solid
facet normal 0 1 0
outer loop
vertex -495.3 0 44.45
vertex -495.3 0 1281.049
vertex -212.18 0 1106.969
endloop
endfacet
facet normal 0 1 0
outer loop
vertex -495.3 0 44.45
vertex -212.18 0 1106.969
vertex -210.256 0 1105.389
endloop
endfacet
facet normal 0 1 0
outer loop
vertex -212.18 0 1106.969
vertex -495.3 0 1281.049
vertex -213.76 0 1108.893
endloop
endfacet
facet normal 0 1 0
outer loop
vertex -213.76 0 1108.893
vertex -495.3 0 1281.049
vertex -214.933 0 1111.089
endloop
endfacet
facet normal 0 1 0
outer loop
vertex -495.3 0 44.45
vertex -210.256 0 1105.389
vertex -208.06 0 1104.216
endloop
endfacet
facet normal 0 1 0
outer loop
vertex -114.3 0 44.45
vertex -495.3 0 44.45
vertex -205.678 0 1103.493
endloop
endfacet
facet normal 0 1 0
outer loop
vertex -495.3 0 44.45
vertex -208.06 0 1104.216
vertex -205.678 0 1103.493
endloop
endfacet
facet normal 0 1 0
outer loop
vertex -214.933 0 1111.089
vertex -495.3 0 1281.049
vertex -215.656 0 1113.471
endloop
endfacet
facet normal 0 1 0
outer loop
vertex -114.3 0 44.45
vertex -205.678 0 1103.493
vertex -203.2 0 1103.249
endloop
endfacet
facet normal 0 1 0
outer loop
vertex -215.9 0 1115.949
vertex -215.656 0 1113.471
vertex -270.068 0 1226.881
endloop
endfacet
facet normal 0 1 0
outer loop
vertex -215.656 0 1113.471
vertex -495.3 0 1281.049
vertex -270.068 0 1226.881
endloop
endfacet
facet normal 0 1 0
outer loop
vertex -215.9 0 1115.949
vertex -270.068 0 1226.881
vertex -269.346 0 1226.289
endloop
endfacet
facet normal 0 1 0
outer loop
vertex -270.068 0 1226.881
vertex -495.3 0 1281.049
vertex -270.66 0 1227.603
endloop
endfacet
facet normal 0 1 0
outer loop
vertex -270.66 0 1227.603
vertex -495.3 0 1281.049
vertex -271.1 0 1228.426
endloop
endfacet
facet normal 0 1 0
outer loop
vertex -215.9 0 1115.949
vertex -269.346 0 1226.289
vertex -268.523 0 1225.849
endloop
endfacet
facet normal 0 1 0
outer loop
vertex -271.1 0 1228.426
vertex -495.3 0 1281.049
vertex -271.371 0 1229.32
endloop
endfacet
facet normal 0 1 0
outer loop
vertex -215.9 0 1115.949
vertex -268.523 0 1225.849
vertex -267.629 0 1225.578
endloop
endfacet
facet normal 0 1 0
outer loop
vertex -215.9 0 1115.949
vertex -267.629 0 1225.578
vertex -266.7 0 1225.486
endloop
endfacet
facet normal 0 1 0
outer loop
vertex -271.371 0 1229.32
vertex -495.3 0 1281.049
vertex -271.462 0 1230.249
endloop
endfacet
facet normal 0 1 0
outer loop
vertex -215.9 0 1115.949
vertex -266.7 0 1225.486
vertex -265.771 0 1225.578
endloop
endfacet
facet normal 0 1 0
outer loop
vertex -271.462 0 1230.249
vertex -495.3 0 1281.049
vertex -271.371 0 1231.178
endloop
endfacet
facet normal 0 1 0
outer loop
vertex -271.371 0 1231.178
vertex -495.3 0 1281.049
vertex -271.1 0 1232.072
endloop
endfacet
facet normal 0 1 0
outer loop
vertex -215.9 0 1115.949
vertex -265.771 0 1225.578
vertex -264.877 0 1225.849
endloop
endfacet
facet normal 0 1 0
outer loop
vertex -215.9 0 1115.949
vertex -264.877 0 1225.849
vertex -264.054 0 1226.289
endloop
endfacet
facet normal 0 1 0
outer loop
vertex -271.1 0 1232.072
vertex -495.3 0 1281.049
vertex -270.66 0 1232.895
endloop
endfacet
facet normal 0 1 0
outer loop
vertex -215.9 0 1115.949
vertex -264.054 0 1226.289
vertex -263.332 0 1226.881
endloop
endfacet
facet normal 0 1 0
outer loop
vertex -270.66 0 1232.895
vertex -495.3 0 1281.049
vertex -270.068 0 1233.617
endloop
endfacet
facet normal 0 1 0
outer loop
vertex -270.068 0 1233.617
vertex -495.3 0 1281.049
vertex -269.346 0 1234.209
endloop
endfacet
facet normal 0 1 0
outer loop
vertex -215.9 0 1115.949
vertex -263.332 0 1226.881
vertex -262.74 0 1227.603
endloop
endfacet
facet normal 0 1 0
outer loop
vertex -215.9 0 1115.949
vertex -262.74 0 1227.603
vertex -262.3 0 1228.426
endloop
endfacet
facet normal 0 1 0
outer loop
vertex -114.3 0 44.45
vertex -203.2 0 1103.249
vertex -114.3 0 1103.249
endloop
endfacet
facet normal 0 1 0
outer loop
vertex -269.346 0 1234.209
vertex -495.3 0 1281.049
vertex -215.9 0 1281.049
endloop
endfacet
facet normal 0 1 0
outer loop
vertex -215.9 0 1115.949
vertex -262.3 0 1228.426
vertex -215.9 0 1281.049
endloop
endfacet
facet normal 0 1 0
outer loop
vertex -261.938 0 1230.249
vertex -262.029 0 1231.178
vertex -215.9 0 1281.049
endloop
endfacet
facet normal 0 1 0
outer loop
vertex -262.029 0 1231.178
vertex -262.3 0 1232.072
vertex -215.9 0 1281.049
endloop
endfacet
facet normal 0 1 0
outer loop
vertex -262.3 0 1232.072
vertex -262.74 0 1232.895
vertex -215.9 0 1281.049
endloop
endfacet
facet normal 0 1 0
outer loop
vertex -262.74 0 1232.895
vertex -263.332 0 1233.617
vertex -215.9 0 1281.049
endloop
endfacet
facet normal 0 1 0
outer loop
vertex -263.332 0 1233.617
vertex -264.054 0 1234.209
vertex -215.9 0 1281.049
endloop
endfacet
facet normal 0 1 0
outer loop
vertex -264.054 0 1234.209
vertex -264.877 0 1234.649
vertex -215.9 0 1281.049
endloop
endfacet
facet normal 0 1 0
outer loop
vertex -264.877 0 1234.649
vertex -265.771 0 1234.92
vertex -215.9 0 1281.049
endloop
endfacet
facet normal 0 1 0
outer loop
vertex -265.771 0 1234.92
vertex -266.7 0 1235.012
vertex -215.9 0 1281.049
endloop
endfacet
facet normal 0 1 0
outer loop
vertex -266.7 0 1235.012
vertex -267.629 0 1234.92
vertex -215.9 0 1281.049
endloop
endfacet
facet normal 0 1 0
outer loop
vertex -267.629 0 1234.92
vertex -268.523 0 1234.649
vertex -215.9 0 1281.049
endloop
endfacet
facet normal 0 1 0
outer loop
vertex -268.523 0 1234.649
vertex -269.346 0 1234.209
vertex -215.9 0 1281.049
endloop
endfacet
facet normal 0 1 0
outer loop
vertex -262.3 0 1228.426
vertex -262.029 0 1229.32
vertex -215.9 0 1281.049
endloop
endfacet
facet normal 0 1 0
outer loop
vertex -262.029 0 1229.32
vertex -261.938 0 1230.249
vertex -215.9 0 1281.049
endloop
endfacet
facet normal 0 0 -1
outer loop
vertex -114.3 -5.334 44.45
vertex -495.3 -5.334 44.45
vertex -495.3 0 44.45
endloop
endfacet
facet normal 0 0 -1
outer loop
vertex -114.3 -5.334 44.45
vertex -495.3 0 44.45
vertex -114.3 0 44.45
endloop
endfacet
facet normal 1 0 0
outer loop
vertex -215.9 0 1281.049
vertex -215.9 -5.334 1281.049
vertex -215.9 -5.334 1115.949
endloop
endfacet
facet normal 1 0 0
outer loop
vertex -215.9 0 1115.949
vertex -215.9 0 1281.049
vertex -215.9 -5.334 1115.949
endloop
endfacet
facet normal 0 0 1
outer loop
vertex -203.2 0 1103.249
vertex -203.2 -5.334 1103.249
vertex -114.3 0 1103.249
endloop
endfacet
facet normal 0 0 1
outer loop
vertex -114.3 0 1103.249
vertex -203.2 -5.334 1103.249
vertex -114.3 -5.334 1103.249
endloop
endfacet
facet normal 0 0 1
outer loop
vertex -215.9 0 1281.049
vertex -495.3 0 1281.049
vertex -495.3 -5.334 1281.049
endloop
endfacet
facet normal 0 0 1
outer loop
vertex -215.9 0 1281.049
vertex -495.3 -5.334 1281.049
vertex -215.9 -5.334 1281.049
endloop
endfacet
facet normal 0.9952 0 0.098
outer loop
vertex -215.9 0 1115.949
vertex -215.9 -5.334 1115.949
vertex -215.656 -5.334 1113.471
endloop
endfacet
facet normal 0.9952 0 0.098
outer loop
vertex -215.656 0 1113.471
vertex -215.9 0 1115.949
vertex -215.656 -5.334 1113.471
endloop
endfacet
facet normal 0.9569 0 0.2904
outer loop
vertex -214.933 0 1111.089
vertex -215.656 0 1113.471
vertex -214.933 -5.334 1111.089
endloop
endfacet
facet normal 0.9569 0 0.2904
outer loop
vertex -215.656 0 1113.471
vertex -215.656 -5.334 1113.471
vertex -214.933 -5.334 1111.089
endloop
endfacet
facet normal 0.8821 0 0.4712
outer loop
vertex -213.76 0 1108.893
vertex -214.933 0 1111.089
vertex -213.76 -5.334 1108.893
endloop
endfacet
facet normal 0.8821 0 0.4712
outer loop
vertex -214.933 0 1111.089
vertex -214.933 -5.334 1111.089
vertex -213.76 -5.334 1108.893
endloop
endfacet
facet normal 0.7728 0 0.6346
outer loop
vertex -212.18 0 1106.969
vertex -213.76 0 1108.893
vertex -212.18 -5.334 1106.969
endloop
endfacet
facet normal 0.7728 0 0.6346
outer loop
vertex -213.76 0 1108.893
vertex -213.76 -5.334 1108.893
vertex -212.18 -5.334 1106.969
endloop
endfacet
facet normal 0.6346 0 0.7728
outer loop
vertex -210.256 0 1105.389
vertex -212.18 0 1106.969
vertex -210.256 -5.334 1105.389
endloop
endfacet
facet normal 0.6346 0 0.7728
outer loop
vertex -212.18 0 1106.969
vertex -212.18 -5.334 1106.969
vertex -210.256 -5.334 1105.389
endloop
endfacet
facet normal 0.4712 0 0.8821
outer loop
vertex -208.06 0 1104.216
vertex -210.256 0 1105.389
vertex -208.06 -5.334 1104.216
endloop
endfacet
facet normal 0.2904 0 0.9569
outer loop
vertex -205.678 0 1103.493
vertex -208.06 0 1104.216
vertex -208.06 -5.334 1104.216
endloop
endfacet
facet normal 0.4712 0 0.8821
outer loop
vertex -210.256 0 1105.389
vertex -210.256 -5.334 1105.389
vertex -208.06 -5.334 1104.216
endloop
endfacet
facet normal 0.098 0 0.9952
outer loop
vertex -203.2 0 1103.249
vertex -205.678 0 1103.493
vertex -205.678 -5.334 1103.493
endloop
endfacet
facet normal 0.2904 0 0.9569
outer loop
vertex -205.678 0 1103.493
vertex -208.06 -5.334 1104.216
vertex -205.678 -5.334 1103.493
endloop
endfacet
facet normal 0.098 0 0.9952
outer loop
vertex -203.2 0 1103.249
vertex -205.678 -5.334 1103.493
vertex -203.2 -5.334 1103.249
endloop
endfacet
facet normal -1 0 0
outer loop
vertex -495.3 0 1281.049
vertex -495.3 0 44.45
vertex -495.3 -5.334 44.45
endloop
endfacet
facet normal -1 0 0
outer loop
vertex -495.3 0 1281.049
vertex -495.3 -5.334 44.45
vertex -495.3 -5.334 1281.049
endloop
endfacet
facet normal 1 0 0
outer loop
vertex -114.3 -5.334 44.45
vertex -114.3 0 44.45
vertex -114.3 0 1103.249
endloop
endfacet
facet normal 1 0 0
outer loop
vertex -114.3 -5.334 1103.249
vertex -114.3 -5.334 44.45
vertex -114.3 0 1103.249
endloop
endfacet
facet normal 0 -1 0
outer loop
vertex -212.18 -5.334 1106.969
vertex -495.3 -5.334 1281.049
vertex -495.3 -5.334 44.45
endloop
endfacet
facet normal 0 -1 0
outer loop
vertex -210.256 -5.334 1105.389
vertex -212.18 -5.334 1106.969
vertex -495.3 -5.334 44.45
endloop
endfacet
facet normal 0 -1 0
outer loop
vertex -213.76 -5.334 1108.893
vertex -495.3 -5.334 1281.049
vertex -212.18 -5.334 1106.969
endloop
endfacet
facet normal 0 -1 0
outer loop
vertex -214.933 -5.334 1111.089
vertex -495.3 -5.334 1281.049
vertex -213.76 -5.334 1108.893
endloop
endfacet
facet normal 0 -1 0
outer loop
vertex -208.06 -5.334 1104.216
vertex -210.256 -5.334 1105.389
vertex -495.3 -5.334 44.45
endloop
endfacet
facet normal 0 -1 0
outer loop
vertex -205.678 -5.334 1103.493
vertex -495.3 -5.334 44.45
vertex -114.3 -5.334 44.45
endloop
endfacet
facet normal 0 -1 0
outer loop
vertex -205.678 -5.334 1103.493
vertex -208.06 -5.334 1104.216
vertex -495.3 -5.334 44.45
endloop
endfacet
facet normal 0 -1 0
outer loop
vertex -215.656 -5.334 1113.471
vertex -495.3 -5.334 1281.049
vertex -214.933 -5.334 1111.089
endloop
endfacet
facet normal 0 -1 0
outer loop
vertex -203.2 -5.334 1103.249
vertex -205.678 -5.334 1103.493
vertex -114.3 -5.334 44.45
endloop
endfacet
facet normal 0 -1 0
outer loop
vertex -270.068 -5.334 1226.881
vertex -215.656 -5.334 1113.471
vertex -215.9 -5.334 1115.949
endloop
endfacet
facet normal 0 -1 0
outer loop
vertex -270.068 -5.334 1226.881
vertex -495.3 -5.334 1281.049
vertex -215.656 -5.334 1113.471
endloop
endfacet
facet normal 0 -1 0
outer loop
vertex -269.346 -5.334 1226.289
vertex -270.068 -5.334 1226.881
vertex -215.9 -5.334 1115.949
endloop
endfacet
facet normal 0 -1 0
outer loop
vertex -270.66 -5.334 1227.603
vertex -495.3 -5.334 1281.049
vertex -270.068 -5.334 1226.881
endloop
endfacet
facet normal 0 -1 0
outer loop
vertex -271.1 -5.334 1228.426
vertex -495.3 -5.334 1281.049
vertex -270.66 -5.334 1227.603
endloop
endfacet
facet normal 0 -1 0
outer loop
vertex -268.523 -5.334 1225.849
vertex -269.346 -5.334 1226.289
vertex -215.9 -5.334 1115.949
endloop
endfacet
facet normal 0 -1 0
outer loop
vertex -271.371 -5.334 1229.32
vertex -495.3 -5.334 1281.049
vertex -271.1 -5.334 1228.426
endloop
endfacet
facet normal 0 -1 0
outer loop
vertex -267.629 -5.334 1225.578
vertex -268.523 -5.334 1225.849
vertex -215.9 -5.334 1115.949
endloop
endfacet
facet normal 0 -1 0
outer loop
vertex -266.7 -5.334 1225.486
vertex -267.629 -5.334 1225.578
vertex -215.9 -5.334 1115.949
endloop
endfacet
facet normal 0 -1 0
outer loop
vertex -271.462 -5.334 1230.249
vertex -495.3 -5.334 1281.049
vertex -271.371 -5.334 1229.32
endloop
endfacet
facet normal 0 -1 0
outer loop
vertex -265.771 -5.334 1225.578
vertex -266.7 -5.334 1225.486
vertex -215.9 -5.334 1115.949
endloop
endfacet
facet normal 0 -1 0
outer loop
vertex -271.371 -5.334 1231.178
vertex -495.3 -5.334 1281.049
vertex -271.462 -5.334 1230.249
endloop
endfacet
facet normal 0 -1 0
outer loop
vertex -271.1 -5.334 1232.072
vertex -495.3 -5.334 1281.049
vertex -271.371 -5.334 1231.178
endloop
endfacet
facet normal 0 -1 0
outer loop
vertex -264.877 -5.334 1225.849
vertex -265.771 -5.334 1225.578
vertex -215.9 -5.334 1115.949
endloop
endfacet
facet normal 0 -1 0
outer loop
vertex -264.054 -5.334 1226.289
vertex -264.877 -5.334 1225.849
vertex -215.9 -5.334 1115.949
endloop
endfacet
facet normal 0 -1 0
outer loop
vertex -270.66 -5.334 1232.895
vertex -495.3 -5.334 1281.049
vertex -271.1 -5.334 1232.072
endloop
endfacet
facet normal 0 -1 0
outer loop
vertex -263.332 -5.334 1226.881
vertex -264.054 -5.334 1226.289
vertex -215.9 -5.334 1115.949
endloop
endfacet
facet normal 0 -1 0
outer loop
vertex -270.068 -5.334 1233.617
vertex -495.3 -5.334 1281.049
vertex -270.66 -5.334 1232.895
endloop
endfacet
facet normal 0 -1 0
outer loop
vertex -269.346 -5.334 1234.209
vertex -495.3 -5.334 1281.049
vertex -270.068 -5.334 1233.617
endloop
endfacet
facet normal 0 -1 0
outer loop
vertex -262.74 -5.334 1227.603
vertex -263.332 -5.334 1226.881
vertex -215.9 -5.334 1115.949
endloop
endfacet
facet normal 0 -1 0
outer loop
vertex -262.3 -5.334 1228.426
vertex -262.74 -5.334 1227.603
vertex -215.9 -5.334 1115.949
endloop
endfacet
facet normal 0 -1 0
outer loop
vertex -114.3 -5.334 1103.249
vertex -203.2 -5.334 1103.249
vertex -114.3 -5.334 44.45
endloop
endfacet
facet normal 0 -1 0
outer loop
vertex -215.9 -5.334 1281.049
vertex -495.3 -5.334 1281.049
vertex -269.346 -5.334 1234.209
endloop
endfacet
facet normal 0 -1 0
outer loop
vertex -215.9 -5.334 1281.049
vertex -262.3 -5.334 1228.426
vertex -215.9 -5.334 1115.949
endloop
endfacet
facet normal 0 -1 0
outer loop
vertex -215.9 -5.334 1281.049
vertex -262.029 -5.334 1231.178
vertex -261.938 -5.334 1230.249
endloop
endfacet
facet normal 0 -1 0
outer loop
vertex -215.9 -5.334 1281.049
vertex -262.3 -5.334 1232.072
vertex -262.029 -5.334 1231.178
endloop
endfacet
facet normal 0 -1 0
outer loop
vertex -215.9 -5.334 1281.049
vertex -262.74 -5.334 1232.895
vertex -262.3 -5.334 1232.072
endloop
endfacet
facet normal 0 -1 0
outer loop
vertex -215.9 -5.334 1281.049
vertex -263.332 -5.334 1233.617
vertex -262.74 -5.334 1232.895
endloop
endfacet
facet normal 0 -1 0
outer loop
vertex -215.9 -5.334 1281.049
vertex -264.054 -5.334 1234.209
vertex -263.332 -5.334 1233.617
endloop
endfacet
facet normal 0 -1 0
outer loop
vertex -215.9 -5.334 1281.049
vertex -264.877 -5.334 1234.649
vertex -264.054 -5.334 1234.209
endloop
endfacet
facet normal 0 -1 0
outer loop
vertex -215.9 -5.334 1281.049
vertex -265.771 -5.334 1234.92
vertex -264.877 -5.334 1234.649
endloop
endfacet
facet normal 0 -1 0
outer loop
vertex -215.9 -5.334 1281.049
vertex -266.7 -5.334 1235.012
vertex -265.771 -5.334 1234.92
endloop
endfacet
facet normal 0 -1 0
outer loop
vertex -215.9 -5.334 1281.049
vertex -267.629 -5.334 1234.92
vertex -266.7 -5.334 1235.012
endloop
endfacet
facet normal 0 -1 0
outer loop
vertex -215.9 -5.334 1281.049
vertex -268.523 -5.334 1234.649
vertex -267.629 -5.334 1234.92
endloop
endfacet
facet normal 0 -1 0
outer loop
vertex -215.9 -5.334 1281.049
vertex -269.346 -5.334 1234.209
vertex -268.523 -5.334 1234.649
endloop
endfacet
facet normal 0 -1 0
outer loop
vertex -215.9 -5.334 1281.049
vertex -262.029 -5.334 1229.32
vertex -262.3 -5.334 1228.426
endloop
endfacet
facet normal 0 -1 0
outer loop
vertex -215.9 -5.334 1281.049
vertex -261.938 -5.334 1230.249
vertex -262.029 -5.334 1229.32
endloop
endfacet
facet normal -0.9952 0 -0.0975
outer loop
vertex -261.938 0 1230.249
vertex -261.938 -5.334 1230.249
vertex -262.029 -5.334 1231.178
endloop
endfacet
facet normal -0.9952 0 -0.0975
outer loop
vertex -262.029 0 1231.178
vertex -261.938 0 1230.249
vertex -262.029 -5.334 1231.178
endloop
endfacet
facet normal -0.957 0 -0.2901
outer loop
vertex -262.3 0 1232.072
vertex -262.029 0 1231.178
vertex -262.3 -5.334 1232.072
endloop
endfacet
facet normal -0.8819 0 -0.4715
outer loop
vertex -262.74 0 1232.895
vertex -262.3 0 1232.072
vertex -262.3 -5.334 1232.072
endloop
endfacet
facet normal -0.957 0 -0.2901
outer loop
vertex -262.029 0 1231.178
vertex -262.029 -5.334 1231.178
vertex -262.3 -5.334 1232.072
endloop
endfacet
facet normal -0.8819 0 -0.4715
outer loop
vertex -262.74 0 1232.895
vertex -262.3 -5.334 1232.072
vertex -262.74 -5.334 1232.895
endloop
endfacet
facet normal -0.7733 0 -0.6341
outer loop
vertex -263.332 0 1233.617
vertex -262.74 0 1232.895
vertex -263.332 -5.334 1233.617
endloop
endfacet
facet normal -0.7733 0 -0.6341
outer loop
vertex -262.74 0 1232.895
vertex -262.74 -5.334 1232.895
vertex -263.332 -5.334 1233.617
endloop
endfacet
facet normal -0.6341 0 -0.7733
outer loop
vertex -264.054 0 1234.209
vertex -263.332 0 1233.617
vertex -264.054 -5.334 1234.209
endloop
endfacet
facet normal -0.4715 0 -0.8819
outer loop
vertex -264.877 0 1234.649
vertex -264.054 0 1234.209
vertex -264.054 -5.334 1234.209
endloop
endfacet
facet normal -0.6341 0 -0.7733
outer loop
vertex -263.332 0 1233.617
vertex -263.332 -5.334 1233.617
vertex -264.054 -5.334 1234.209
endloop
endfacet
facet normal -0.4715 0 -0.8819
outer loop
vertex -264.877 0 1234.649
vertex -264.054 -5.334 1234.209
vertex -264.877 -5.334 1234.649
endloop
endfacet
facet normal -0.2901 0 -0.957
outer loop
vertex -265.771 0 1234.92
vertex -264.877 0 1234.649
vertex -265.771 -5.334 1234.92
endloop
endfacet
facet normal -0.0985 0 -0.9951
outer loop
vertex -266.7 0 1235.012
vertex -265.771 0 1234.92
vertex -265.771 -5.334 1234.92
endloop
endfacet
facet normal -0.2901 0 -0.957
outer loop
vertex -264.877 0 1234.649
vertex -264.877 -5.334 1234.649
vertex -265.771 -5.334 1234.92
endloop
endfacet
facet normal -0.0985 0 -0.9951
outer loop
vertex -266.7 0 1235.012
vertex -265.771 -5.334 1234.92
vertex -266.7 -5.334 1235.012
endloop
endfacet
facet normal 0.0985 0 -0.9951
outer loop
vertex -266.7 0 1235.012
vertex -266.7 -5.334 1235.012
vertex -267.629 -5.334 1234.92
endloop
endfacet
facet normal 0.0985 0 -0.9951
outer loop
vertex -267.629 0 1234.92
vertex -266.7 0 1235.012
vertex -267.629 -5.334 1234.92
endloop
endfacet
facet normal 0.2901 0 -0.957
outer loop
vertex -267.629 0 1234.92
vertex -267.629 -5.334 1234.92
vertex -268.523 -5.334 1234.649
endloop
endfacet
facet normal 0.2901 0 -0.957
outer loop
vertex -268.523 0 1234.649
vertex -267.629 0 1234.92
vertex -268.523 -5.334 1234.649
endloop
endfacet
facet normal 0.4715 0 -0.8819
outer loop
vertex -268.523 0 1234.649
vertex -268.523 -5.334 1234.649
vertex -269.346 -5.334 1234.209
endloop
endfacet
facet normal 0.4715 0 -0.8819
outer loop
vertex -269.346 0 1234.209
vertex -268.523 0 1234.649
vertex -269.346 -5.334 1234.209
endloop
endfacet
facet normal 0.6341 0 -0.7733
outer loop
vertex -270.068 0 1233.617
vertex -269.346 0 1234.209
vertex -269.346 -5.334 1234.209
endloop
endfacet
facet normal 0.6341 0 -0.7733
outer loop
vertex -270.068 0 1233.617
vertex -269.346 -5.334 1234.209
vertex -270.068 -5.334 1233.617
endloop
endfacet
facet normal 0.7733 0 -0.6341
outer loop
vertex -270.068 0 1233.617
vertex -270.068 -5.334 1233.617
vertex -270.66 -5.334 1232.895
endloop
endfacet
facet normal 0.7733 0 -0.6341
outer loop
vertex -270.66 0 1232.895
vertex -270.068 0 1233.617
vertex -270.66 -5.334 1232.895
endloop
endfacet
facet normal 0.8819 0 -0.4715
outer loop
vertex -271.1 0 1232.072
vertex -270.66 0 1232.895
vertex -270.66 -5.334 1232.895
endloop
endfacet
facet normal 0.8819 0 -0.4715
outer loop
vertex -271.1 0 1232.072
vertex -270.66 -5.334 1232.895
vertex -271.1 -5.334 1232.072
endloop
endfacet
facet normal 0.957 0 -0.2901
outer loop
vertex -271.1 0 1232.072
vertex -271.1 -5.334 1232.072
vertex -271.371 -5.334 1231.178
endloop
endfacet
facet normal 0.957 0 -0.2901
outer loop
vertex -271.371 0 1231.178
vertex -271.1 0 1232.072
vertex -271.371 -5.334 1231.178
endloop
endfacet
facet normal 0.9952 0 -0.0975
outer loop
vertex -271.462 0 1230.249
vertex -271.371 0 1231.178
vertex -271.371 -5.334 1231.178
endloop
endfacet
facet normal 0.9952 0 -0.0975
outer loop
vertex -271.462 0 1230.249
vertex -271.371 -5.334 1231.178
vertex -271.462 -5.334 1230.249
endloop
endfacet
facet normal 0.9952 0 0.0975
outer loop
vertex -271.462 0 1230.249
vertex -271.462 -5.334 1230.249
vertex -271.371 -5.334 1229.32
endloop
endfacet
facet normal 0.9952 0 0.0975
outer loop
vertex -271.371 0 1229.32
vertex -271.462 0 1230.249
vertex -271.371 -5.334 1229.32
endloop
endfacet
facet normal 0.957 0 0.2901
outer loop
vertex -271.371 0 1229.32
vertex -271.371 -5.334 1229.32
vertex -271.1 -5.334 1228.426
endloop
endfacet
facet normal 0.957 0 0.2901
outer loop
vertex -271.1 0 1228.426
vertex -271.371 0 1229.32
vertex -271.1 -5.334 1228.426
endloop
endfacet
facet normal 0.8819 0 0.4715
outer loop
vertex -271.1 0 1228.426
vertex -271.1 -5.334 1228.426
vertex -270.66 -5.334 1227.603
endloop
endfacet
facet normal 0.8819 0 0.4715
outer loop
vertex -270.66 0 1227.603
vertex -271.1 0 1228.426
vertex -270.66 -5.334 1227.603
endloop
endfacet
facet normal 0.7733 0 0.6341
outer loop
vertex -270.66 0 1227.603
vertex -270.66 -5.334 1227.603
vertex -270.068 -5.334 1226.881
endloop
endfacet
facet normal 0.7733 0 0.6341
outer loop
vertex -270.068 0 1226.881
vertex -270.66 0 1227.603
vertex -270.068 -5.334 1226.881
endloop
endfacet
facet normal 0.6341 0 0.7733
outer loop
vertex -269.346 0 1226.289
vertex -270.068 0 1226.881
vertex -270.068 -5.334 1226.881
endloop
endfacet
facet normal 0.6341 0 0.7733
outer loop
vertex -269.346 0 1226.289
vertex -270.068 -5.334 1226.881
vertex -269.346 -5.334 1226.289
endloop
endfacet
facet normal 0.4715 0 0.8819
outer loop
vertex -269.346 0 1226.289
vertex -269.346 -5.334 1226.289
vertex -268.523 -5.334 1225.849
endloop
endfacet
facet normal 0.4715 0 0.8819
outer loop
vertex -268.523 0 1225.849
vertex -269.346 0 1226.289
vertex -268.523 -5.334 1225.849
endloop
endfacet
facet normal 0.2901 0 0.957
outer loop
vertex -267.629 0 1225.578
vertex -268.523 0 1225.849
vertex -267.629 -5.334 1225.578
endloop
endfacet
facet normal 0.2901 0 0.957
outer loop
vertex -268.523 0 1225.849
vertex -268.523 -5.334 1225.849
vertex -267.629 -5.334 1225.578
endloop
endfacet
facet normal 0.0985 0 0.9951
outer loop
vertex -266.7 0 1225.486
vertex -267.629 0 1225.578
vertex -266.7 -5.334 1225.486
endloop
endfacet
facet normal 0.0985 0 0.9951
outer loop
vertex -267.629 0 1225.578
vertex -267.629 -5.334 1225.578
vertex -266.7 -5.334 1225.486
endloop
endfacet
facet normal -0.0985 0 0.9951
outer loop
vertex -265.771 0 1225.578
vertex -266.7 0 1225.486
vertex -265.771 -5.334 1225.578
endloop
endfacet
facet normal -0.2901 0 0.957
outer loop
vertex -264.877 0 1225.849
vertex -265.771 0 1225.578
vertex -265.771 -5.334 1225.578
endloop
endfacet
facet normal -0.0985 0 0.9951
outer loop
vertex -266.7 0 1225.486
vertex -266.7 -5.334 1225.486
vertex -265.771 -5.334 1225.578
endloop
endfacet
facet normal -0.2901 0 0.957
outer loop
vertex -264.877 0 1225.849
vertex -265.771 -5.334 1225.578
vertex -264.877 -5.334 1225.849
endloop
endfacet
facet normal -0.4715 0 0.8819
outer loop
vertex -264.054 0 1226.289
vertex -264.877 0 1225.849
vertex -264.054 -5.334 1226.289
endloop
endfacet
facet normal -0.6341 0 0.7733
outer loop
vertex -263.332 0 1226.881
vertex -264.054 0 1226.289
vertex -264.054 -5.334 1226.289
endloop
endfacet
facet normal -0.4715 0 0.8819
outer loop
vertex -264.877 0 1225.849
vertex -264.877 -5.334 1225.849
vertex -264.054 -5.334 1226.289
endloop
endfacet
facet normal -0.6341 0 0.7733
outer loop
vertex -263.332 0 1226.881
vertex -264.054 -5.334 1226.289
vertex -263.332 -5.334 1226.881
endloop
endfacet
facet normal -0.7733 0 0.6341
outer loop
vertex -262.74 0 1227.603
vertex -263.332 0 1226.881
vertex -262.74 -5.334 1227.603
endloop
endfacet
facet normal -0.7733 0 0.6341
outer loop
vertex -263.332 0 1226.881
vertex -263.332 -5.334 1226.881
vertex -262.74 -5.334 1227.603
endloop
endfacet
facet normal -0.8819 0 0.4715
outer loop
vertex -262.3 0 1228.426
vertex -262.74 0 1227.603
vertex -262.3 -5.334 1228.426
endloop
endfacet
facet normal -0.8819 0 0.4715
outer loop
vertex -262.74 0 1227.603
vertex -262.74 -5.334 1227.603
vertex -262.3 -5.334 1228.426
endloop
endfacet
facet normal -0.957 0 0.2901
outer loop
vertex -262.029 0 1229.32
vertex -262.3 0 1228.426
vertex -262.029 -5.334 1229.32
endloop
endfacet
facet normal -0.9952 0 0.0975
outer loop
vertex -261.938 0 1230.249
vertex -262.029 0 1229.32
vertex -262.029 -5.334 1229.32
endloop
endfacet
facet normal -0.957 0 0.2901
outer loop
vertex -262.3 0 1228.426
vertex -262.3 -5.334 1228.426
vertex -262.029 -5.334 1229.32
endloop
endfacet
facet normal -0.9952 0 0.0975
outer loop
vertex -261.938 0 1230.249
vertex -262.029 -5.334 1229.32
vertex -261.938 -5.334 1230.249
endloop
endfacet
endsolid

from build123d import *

# Parameters (mm, degrees)
F0_W     = 381
F0_H     = 1281.049
F1_DEPTH = 5.334
F3_DEPTH = 25.4
F4_W     = 381
F4_H     = 44.45
F5_DEPTH = 25.4
F6_R     = 4.7625
F7_DEPTH = 25.4


with BuildPart() as f1:
    # F0 (on Front) → F1 (new body)
    with BuildSketch(Plane.XZ):
        with Locations((-304.8, 640.5245)):
            Rectangle(F0_W, F0_H)
    extrude(amount=F1_DEPTH)

    # F2 (on face) → F3 (cut)
    with BuildSketch(Plane.XZ.offset(5.334)):
        with BuildLine():
            Line((-114.3, 1103.249), (-114.3, 1281.049))
            Line((-114.3, 1281.049), (-215.9, 1281.049))
            Line((-215.9, 1281.049), (-215.9, 1115.949))
            ThreePointArc((-215.9, 1115.949), (-212.180256, 1106.968744), (-203.2, 1103.249))
            Line((-203.2, 1103.249), (-114.3, 1103.249))
        make_face()
    extrude(amount=-F3_DEPTH, mode=Mode.SUBTRACT)

    # F4 (on face) → F5 (cut)
    with BuildSketch(Plane.XZ.offset(5.334)):
        with Locations((-304.8, 22.225)):
            Rectangle(F4_W, F4_H)
    extrude(amount=-F5_DEPTH, mode=Mode.SUBTRACT)

    # F6 (on face) → F7 (cut)
    with BuildSketch(Plane.XZ.offset(5.334)):
        with Locations((-266.7, 1230.249)):
            Circle(F6_R)
    extrude(amount=-F7_DEPTH, mode=Mode.SUBTRACT)


solid = f1.part
